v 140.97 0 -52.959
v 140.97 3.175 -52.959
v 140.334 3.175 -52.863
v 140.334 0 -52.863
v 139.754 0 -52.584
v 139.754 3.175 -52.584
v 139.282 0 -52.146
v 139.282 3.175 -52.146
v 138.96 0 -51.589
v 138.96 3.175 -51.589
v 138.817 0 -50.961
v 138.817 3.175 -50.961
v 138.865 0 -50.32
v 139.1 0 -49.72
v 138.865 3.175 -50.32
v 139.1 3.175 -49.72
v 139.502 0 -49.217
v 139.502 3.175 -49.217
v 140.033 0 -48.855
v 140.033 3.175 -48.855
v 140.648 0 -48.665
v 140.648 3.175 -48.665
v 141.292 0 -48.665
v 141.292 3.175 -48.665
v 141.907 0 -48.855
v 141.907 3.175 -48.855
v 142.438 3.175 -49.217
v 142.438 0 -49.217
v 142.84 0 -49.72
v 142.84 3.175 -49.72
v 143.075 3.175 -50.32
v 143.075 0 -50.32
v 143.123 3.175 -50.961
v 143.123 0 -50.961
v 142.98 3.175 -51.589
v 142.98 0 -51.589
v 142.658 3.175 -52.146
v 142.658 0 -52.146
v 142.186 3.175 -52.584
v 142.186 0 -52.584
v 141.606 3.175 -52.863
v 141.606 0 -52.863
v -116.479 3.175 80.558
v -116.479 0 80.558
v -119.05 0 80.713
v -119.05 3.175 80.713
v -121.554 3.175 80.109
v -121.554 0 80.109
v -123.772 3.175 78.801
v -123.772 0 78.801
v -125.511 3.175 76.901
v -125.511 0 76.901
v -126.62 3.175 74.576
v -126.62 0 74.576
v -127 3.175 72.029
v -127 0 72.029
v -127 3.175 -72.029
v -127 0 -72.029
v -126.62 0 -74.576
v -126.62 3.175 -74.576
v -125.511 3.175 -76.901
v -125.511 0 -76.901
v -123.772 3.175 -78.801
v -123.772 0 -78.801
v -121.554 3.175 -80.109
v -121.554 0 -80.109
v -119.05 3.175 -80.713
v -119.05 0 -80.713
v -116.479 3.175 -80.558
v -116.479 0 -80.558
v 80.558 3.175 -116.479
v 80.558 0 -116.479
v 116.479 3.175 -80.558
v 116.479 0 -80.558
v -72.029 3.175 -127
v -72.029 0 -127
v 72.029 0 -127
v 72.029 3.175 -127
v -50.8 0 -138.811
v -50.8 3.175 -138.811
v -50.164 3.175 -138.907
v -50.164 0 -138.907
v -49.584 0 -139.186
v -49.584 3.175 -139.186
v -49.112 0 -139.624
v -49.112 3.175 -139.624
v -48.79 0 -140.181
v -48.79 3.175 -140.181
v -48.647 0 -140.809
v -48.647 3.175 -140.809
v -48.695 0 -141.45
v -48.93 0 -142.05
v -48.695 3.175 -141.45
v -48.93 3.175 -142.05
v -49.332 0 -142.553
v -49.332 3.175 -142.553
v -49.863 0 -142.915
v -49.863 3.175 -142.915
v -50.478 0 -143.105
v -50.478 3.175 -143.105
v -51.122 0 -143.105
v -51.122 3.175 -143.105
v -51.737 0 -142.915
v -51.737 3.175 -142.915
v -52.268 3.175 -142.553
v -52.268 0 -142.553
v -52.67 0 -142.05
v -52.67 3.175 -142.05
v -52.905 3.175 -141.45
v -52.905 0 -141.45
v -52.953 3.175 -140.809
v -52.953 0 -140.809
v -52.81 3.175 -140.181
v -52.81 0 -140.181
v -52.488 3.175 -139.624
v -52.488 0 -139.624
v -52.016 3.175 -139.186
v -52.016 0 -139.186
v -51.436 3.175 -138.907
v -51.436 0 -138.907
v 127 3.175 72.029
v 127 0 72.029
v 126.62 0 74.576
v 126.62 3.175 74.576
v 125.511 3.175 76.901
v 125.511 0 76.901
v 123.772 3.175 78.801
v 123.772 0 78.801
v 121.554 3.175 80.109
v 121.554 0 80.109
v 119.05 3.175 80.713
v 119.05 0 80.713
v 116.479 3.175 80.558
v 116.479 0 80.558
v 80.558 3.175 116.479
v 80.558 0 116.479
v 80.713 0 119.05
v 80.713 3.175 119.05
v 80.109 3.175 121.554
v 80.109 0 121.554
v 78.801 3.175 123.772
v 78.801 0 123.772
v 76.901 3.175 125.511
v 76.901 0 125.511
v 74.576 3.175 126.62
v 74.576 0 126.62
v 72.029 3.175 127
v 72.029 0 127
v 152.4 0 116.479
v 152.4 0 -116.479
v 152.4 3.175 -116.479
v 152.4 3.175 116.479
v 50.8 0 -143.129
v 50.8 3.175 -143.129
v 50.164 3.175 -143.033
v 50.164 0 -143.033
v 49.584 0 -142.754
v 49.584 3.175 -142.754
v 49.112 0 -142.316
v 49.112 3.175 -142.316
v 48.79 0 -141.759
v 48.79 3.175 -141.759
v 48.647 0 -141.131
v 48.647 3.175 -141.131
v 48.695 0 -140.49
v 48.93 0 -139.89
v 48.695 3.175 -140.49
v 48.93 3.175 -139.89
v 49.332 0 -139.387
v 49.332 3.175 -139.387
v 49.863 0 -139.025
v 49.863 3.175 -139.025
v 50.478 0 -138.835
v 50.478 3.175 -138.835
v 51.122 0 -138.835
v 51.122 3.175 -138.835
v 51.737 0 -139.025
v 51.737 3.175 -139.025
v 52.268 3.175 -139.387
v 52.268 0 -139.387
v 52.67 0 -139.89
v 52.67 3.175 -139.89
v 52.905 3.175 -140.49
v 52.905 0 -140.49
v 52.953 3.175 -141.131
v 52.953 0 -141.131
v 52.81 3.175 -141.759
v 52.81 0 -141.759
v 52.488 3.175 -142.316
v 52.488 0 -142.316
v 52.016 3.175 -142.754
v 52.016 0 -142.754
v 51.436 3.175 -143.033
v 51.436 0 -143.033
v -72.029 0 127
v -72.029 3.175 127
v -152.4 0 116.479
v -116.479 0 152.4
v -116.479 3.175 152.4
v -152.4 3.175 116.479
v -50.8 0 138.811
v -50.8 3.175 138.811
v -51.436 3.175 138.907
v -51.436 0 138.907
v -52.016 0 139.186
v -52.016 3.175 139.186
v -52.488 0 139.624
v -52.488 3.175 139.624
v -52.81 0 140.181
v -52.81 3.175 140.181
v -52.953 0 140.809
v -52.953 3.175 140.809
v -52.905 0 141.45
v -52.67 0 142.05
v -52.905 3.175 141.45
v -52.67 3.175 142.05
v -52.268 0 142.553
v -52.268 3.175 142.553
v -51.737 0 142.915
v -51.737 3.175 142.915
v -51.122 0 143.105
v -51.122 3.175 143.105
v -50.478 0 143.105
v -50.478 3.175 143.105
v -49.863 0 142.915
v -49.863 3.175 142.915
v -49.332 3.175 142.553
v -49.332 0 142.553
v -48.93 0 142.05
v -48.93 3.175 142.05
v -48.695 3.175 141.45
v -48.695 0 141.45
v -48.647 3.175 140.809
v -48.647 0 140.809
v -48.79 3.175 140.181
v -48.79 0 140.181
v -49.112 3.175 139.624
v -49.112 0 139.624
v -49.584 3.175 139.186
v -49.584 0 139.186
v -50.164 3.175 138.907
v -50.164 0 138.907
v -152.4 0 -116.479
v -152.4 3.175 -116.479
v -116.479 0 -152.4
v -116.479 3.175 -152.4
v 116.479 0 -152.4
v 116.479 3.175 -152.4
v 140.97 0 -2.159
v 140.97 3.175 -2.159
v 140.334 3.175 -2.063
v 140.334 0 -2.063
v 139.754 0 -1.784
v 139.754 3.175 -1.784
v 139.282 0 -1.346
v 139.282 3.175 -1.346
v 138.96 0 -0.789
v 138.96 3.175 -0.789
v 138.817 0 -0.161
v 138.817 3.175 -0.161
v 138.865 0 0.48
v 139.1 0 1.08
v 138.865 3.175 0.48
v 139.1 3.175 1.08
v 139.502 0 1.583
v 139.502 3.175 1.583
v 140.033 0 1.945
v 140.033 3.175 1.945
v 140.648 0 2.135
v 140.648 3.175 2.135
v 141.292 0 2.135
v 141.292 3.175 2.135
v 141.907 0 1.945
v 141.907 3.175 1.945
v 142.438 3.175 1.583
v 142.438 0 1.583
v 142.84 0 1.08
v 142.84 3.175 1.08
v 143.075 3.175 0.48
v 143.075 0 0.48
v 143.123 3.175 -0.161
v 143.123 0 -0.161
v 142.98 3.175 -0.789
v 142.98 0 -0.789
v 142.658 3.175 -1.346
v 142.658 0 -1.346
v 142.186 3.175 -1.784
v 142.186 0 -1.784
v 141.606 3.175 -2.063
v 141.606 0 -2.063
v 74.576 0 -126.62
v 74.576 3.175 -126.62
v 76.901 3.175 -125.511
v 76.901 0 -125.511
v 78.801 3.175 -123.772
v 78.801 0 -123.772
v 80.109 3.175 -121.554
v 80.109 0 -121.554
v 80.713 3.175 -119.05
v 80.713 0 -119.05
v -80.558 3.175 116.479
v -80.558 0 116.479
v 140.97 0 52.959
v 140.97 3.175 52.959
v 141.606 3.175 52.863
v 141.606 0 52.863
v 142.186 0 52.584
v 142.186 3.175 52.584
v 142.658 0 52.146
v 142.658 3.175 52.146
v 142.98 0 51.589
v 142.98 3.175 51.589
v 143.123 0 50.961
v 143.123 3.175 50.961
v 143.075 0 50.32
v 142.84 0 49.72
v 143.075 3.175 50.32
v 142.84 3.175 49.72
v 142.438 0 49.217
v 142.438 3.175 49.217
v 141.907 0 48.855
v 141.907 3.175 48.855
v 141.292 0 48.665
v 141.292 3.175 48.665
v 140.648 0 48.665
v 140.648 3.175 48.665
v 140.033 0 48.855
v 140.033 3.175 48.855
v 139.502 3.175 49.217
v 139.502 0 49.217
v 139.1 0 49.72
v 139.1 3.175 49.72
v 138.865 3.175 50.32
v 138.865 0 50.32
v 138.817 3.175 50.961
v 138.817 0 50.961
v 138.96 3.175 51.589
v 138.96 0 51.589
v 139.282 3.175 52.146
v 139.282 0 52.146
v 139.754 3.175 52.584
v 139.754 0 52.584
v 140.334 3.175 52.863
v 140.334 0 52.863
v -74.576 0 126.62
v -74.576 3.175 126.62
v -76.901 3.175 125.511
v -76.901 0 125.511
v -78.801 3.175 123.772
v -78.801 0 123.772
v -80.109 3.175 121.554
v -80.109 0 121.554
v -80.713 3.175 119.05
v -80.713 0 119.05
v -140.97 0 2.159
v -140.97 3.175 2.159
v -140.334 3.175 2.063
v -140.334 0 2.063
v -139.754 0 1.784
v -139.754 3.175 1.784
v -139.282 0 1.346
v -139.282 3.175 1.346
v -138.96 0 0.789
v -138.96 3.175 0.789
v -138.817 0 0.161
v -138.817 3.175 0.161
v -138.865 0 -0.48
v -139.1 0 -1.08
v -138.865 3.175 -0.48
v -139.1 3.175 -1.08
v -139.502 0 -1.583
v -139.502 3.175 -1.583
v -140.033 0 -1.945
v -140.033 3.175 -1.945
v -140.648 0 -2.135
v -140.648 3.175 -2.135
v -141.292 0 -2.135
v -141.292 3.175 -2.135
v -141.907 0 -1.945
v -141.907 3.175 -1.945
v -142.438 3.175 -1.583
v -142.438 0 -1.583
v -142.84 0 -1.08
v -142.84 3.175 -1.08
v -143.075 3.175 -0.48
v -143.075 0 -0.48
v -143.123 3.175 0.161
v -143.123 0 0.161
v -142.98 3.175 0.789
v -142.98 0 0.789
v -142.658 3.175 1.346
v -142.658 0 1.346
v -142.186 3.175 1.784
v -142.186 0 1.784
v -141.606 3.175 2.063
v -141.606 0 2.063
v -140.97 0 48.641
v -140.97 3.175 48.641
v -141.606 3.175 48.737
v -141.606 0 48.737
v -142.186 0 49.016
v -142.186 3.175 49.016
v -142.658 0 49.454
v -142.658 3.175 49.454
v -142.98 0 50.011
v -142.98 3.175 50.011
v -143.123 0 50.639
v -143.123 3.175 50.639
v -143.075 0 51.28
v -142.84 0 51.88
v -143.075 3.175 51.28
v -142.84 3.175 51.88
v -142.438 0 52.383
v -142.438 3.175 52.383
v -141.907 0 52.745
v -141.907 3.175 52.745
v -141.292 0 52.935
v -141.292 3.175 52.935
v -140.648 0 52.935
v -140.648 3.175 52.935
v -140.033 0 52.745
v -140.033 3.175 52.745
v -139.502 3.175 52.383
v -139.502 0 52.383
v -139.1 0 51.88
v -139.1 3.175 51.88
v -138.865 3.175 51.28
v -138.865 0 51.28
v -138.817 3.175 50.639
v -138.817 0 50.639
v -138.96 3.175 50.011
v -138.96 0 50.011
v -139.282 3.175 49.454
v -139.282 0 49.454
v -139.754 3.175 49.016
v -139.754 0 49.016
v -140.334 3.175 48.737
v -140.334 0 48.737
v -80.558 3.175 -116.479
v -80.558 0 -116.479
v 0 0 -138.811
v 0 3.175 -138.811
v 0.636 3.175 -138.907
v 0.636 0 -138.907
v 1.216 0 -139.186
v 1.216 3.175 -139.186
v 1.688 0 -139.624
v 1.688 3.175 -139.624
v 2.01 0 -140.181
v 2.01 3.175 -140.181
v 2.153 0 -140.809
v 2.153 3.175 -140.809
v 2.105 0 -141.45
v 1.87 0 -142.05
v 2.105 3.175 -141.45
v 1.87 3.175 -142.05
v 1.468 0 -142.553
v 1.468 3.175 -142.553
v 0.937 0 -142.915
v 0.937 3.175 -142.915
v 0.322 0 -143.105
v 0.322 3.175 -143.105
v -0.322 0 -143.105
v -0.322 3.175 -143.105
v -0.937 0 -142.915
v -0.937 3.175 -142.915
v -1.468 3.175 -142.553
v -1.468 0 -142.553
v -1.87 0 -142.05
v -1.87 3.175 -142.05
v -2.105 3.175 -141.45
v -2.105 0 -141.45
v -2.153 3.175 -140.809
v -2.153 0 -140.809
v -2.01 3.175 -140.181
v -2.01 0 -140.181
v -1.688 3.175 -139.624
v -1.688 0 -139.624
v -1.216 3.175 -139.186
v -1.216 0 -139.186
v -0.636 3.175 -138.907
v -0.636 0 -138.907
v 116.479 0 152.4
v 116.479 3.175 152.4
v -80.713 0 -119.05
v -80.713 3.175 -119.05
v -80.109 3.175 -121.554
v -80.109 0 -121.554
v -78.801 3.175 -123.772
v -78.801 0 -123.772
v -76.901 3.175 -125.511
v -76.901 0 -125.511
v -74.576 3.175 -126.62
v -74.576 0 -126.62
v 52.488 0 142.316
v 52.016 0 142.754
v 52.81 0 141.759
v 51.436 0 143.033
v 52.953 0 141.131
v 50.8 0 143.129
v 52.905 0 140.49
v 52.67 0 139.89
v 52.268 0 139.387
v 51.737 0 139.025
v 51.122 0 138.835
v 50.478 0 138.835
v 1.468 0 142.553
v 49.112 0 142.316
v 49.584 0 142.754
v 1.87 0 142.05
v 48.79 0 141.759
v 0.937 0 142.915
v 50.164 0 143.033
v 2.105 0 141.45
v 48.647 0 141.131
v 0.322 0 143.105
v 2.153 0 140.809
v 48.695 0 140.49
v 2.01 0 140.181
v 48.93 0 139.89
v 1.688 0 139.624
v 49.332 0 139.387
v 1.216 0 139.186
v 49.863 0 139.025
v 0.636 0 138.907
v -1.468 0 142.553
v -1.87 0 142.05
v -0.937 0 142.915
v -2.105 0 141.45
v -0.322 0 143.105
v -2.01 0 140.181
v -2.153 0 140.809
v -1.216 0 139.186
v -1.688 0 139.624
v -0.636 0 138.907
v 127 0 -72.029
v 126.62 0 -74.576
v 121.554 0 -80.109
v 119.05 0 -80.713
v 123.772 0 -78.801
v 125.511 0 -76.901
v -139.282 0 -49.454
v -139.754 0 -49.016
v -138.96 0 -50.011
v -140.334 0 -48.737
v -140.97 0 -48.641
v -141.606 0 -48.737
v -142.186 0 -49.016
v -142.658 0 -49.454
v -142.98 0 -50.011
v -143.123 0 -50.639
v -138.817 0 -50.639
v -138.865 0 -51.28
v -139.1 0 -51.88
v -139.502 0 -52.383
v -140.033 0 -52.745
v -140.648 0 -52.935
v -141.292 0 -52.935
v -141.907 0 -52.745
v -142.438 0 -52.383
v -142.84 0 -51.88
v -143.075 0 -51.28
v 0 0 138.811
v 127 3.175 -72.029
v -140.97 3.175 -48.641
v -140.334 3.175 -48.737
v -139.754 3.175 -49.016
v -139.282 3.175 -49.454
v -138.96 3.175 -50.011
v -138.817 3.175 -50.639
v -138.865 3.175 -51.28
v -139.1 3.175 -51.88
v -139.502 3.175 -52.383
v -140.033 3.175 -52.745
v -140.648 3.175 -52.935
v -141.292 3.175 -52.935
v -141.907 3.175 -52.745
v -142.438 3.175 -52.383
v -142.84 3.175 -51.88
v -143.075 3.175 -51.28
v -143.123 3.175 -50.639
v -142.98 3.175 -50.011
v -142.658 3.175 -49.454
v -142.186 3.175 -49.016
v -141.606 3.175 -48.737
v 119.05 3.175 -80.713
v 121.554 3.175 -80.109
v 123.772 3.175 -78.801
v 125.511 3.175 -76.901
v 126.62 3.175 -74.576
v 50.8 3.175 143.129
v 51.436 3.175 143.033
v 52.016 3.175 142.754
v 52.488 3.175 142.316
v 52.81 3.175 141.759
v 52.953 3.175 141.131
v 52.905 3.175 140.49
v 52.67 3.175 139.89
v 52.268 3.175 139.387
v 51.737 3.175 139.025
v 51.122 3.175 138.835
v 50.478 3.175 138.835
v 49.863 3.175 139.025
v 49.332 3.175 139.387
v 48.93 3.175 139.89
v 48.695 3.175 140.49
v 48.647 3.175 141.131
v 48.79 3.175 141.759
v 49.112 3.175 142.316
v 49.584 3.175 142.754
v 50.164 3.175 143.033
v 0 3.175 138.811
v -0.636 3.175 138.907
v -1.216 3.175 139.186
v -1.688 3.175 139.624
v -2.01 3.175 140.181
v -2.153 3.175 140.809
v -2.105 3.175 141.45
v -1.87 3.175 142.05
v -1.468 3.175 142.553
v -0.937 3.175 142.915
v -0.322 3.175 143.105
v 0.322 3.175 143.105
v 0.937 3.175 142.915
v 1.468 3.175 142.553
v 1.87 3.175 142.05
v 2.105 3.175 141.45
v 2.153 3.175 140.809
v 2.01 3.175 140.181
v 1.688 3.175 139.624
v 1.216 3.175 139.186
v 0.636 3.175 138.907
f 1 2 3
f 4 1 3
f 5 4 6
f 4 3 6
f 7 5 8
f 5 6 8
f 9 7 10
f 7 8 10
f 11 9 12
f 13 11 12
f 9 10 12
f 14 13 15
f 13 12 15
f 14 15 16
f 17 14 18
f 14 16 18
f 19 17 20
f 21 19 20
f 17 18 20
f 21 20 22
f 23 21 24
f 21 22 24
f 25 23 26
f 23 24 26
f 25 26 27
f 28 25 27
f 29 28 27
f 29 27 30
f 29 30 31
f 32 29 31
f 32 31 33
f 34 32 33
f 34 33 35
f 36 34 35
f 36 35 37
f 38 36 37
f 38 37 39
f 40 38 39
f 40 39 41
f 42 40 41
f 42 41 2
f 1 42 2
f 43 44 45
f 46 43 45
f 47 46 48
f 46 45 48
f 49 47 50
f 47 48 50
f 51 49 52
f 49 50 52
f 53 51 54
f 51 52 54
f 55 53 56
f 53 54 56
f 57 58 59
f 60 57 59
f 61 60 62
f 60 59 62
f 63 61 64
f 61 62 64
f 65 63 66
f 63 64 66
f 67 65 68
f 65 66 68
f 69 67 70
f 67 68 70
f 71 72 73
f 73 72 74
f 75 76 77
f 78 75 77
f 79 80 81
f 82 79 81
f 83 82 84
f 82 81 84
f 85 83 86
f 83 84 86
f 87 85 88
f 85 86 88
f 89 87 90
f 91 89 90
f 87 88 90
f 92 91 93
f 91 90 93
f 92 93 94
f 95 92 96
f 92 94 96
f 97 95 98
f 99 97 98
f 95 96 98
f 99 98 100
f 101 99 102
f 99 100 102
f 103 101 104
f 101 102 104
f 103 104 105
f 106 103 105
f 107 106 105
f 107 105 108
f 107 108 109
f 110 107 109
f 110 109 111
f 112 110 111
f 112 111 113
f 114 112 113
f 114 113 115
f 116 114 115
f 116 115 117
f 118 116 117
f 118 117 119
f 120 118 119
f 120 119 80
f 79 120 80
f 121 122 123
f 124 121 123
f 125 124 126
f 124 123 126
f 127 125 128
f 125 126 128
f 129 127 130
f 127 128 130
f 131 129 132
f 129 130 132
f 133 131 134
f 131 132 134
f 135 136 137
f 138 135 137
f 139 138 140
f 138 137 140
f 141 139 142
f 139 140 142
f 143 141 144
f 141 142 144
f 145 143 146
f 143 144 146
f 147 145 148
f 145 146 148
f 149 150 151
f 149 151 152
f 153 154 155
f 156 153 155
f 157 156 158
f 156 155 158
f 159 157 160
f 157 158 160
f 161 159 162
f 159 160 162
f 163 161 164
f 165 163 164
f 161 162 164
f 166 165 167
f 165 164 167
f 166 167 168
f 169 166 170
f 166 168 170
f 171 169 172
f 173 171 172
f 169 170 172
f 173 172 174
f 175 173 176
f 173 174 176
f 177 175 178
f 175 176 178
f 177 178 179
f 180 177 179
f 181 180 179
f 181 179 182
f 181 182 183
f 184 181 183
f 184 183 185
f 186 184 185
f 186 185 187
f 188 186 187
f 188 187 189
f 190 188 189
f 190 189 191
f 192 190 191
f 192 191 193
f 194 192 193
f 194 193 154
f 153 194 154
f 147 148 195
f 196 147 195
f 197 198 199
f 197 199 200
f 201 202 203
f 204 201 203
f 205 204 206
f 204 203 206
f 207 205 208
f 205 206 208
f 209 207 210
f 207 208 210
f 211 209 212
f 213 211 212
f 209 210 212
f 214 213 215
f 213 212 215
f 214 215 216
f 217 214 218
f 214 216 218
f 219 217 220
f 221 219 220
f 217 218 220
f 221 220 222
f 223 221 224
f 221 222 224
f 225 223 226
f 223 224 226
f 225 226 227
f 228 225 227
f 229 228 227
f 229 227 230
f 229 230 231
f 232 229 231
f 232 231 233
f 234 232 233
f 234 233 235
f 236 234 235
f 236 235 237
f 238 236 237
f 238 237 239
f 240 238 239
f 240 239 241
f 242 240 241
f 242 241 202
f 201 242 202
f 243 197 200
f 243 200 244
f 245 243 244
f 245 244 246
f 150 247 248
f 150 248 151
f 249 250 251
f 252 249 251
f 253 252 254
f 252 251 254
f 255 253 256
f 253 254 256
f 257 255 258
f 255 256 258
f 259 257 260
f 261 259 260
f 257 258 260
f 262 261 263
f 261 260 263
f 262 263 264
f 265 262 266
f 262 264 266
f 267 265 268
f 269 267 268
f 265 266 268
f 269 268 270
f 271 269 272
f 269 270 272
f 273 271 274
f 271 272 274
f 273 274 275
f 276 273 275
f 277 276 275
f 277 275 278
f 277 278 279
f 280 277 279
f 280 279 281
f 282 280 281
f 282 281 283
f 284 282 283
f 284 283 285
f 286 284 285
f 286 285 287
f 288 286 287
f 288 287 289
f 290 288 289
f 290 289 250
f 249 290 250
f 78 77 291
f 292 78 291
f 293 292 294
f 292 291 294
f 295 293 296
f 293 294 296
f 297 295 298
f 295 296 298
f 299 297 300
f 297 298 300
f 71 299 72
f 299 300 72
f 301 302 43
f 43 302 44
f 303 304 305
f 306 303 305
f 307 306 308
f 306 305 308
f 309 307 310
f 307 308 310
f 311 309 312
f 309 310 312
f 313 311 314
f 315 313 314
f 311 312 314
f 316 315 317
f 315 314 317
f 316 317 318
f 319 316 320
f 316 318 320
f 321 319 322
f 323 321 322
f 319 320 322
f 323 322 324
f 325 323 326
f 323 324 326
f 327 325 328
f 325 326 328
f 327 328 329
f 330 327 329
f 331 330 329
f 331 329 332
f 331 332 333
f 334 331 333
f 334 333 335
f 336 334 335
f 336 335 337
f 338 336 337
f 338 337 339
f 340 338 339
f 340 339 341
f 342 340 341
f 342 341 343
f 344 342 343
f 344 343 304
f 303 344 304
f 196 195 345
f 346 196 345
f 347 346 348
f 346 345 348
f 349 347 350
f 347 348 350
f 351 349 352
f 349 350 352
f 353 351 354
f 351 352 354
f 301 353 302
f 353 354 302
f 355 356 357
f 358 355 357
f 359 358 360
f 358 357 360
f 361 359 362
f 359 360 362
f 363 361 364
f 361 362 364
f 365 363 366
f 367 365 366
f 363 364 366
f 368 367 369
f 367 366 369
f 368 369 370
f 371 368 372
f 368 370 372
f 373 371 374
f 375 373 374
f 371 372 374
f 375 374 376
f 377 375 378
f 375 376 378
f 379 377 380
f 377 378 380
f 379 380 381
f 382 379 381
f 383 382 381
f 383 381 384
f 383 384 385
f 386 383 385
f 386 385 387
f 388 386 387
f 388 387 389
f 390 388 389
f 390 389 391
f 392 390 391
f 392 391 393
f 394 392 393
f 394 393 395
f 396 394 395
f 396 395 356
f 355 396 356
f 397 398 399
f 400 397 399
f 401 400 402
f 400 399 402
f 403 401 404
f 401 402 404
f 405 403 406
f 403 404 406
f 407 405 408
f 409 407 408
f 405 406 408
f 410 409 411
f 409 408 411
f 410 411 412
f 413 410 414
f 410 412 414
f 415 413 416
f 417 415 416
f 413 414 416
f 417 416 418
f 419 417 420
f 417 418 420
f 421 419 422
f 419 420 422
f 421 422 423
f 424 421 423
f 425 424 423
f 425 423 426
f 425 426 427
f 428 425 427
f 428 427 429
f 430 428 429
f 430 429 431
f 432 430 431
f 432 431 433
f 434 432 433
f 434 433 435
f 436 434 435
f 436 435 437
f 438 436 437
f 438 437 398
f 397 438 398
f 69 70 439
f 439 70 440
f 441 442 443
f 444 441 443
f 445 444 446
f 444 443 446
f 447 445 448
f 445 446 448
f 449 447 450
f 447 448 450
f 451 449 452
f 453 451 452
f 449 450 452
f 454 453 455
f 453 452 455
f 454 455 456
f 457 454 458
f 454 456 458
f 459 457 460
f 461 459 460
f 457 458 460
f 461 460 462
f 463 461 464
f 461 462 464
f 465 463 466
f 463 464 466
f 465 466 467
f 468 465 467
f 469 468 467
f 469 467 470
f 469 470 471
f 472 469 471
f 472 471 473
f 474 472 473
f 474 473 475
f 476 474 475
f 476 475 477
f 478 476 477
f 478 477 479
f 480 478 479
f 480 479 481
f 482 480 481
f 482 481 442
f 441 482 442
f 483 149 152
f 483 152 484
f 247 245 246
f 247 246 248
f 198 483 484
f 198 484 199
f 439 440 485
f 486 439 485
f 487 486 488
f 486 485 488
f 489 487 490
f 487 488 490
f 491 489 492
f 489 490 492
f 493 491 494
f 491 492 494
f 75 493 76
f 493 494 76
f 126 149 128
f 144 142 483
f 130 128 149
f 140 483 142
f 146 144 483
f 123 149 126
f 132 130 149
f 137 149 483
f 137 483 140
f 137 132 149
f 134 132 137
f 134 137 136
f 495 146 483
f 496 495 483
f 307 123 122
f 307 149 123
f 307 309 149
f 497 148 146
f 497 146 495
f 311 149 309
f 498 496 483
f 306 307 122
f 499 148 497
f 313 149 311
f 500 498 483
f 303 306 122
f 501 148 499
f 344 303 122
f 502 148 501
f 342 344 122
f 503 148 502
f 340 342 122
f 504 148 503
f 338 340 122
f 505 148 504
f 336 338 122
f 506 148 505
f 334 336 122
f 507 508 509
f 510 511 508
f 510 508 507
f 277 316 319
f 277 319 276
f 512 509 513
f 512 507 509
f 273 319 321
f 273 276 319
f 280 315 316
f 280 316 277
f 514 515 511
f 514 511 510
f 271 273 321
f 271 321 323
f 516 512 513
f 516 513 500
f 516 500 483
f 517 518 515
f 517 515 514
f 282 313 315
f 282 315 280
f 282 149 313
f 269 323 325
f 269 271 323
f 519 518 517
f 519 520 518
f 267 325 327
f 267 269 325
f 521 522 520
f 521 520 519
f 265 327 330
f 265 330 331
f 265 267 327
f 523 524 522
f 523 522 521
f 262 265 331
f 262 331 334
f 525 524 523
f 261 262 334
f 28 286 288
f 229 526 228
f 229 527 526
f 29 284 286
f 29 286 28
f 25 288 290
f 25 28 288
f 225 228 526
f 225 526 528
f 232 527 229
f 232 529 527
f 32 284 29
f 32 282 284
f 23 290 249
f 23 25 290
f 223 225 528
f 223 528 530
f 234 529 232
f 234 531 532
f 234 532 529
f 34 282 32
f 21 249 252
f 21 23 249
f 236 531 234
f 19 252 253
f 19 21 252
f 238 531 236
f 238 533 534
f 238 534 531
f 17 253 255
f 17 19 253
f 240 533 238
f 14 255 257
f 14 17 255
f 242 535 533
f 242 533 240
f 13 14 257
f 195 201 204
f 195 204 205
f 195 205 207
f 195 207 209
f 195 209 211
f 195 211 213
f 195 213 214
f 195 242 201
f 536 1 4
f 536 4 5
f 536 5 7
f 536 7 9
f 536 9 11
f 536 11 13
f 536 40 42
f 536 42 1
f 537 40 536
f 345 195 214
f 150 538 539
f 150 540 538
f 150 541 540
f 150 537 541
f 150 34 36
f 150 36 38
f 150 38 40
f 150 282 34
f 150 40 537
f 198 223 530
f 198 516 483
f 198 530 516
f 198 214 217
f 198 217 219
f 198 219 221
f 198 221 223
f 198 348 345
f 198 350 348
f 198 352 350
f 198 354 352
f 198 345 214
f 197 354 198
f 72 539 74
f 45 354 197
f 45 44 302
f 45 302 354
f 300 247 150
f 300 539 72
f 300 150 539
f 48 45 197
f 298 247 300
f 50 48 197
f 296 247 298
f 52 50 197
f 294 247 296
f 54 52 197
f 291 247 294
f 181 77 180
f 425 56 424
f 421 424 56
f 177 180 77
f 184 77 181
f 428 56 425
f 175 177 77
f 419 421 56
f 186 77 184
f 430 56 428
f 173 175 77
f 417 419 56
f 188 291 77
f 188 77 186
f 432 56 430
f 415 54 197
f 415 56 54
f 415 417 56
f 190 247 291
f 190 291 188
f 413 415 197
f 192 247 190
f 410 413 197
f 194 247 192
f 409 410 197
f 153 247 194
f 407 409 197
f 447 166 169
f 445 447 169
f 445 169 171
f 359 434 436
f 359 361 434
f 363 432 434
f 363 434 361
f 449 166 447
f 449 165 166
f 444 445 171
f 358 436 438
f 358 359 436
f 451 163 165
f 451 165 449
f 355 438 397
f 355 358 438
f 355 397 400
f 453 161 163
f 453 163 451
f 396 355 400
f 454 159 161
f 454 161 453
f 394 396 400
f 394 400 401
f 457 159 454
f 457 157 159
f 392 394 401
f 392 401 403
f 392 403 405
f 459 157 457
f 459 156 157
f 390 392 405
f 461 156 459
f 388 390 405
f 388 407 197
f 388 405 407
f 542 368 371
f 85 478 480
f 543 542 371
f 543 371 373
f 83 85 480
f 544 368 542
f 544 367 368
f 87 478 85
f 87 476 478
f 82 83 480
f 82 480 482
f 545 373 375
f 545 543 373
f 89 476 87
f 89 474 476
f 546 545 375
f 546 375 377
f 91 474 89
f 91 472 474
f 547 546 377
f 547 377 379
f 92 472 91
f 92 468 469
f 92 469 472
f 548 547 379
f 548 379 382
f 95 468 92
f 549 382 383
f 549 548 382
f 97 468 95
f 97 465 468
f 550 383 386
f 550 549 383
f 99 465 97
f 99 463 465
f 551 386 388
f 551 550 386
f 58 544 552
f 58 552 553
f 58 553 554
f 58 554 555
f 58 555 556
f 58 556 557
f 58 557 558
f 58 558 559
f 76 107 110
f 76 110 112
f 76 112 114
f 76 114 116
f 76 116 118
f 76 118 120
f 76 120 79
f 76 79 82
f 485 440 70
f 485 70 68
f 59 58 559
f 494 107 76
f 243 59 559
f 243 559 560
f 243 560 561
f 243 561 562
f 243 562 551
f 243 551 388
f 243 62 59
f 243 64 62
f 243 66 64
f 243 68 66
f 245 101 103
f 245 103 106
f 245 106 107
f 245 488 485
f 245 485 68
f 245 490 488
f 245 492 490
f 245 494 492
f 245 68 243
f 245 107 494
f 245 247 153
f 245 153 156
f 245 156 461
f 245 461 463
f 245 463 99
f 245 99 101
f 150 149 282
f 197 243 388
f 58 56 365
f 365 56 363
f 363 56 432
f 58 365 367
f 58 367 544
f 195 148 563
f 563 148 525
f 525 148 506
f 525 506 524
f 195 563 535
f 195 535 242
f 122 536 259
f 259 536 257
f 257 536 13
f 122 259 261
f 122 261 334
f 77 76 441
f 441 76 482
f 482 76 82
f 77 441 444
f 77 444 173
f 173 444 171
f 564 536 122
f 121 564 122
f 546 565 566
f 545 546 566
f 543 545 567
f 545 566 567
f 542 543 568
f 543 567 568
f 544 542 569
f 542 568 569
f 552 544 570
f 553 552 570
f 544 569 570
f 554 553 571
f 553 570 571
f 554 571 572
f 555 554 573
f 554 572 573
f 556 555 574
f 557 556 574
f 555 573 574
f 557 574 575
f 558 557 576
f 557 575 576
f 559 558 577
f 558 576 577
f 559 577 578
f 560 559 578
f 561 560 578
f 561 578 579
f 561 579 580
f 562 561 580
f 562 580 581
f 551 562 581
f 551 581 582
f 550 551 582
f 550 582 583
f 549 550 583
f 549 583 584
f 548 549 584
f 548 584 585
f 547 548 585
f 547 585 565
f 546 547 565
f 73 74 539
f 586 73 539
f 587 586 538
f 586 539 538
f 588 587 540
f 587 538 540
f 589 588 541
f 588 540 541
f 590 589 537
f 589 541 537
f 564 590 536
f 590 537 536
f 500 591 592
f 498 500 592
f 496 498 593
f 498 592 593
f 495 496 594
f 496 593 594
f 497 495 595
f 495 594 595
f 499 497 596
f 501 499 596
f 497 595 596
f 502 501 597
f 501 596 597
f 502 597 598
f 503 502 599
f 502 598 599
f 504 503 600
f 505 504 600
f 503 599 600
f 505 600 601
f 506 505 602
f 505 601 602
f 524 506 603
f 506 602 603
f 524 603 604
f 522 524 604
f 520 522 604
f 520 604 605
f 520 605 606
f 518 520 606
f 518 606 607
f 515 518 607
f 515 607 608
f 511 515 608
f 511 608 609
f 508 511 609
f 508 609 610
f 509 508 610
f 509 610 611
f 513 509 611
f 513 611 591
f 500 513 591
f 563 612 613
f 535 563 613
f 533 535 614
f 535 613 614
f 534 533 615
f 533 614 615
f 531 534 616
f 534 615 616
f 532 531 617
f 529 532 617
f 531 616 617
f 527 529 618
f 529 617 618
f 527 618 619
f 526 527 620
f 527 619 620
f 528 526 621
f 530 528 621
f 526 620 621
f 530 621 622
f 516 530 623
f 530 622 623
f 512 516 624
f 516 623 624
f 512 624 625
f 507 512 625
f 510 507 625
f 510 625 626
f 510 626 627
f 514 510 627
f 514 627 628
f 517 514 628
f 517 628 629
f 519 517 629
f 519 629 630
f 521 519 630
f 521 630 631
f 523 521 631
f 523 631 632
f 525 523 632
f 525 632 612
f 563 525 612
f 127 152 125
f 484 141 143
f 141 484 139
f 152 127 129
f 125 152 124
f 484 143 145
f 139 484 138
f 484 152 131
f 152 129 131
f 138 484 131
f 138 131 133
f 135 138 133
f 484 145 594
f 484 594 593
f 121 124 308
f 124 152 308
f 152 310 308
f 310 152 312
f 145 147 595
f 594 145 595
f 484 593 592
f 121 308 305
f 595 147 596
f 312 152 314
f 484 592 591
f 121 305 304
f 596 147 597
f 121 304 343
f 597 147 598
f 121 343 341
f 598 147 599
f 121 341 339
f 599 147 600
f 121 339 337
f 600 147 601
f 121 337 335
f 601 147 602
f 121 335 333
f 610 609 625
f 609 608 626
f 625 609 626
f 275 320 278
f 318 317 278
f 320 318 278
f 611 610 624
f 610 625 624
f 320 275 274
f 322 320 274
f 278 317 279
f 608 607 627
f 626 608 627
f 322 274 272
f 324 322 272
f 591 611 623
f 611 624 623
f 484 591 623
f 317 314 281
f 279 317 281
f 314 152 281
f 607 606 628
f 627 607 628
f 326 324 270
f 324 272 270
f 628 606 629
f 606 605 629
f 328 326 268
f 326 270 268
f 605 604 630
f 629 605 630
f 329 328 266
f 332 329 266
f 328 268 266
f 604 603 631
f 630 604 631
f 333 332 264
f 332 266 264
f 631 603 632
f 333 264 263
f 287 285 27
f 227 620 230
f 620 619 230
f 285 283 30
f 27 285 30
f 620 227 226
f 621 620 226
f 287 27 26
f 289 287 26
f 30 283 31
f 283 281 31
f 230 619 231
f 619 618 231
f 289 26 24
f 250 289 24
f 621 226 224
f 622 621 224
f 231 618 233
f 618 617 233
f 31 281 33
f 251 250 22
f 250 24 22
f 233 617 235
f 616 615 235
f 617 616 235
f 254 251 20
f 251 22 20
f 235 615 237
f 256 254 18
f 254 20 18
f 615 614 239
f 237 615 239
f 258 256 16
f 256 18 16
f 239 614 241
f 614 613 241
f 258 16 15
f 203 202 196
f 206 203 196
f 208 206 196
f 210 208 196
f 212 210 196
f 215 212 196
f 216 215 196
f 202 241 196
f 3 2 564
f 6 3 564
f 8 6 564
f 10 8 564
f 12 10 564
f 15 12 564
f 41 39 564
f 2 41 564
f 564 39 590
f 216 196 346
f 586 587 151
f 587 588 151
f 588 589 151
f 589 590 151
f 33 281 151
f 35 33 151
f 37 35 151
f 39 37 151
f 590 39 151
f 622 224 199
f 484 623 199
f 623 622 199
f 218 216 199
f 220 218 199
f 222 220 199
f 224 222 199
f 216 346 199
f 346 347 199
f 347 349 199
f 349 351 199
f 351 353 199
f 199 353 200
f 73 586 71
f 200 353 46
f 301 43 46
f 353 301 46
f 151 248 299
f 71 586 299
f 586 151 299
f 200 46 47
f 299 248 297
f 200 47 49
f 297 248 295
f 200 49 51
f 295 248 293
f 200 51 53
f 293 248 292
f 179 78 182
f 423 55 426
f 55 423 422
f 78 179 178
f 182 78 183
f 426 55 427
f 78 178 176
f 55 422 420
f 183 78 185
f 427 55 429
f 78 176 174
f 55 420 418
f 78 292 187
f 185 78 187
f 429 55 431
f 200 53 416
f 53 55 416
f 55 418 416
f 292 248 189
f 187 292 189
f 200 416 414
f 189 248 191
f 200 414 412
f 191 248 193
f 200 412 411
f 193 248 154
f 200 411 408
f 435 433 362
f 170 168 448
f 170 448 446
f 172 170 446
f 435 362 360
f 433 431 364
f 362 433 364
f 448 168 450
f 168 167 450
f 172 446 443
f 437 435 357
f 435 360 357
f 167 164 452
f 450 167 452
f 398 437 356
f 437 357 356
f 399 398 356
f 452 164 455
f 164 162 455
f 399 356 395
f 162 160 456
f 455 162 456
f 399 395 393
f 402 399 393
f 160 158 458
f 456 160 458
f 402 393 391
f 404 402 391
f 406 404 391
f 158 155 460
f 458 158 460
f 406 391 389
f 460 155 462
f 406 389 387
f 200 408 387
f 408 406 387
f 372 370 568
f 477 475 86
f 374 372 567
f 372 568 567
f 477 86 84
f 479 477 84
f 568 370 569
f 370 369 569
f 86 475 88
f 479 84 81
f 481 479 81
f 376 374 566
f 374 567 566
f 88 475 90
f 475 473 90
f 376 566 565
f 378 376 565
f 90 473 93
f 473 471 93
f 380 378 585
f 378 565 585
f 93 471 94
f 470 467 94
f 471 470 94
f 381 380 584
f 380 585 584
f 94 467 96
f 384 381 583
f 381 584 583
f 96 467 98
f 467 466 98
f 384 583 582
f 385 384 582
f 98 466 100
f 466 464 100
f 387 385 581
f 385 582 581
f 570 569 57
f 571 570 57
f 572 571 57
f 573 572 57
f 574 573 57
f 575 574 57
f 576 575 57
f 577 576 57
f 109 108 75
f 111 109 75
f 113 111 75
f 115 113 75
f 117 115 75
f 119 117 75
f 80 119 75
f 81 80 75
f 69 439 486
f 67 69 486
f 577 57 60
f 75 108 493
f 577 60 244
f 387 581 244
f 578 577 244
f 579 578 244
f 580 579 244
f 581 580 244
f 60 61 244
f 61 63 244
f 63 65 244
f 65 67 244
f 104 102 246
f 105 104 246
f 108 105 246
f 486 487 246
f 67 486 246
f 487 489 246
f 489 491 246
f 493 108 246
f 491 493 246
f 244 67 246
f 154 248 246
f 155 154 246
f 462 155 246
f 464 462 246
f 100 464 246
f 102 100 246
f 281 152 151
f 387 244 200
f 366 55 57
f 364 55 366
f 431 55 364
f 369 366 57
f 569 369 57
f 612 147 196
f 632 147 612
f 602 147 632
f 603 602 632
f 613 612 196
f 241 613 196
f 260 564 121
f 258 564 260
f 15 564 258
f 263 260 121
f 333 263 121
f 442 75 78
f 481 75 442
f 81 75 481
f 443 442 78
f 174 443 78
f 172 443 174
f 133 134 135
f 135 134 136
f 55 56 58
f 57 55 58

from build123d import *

# Parameters (mm, degrees)
BOSS_EXTRUDE1_DEPTH = 3.175
SKETCH4_R           = 2.159
CUT_EXTRUDE2_DEPTH  = 216.549531721


with BuildPart() as part:
    # Sketch2 → Boss-Extrude1 (new body)
    with BuildSketch(Plane(origin=(0, 0, 0), x_dir=(1, 0, 0), z_dir=(0, 1, 0))):
        Polygon((-152.4, 116.478975516), (-116.478975516, 152.4), (116.478975516, 152.4), (152.4, 116.478975516), (152.4, -116.478975516), (116.478975516, -152.4), (-116.478975516, -152.4), (-152.4, -116.478975516), align=None)
        with BuildLine():
            Line((-116.478975516, 80.557951031), (-80.557951031, 116.478975516))
            ThreePointArc((-80.557951031, 116.478975516), (-78.800891411, 123.772159882), (-72.028975516, 127))
            Line((-72.028975516, 127), (-59.328975516, 127))
            Line((-59.328975516, 127), (59.328975516, 127))
            Line((59.328975516, 127), (72.028975516, 127))
            ThreePointArc((72.028975516, 127), (78.800891411, 123.772159882), (80.557951031, 116.478975516))
            Line((80.557951031, 116.478975516), (116.478975516, 80.557951031))
            ThreePointArc((116.478975516, 80.557951031), (123.772159882, 78.800891411), (127, 72.028975516))
            Line((127, 72.028975516), (127, 59.328975516))
            Line((127, 59.328975516), (127, -59.328975516))
            Line((127, -59.328975516), (127, -72.028975516))
            ThreePointArc((127, -72.028975516), (123.772159882, -78.800891411), (116.478975516, -80.557951031))
            Line((116.478975516, -80.557951031), (80.557951031, -116.478975516))
            ThreePointArc((80.557951031, -116.478975516), (78.800891411, -123.772159882), (72.028975516, -127))
            Line((72.028975516, -127), (59.328975516, -127))
            Line((59.328975516, -127), (-59.328975516, -127))
            Line((-59.328975516, -127), (-72.028975516, -127))
            ThreePointArc((-72.028975516, -127), (-78.800891411, -123.772159882), (-80.557951031, -116.478975516))
            Line((-80.557951031, -116.478975516), (-116.478975516, -80.557951031))
            ThreePointArc((-116.478975516, -80.557951031), (-123.772159882, -78.800891411), (-127, -72.028975516))
            Line((-127, -72.028975516), (-127, -59.328975516))
            Line((-127, -59.328975516), (-127, 59.328975516))
            Line((-127, 59.328975516), (-127, 72.028975516))
            ThreePointArc((-127, 72.028975516), (-123.772159882, 78.800891411), (-116.478975516, 80.557951031))
        make_face(mode=Mode.SUBTRACT)
    extrude(amount=BOSS_EXTRUDE1_DEPTH)

    # Sketch4 → Cut-Extrude2 (cut, through all)
    with BuildSketch(Plane(origin=(0, 3.175, 0), x_dir=(1, 0, 0), z_dir=(0, 1, 0))):
        with Locations(Location((0, 140.97, 0), (0, 0, 270))):
            Circle(SKETCH4_R)
        with Locations(Location((-50.8, 140.97, 0), (0, 0, 270))):
            Circle(SKETCH4_R)
        with Locations(Location((-140.97, 50.8, 0), (0, 0, 270))):
            Circle(SKETCH4_R)
        with Locations(Location((-140.97, 0, 0), (0, 0, 270))):
            Circle(SKETCH4_R)
        with Locations(Location((140.97, 0, 0), (0, 0, 90))):
            Circle(SKETCH4_R)
        with Locations(Location((140.97, 50.8, 0), (0, 0, 90))):
            Circle(SKETCH4_R)
        with Locations(Location((50.8, 140.97, 0), (0, 0, 90))):
            Circle(SKETCH4_R)
        with Locations(Location((50.8, -140.97, 0), (0, 0, 270))):
            Circle(SKETCH4_R)
        with Locations(Location((140.97, -50.8, 0), (0, 0, 270))):
            Circle(SKETCH4_R)
        with Locations(Location((-50.8, -140.97, 0), (0, 0, 90))):
            Circle(SKETCH4_R)
        with Locations(Location((0, -140.97, 0), (0, 0, 90))):
            Circle(SKETCH4_R)
        with Locations(Location((-140.97, -50.8, 0), (0, 0, 90))):
            Circle(SKETCH4_R)
    extrude(amount=-CUT_EXTRUDE2_DEPTH, mode=Mode.SUBTRACT)


solid = part.part
